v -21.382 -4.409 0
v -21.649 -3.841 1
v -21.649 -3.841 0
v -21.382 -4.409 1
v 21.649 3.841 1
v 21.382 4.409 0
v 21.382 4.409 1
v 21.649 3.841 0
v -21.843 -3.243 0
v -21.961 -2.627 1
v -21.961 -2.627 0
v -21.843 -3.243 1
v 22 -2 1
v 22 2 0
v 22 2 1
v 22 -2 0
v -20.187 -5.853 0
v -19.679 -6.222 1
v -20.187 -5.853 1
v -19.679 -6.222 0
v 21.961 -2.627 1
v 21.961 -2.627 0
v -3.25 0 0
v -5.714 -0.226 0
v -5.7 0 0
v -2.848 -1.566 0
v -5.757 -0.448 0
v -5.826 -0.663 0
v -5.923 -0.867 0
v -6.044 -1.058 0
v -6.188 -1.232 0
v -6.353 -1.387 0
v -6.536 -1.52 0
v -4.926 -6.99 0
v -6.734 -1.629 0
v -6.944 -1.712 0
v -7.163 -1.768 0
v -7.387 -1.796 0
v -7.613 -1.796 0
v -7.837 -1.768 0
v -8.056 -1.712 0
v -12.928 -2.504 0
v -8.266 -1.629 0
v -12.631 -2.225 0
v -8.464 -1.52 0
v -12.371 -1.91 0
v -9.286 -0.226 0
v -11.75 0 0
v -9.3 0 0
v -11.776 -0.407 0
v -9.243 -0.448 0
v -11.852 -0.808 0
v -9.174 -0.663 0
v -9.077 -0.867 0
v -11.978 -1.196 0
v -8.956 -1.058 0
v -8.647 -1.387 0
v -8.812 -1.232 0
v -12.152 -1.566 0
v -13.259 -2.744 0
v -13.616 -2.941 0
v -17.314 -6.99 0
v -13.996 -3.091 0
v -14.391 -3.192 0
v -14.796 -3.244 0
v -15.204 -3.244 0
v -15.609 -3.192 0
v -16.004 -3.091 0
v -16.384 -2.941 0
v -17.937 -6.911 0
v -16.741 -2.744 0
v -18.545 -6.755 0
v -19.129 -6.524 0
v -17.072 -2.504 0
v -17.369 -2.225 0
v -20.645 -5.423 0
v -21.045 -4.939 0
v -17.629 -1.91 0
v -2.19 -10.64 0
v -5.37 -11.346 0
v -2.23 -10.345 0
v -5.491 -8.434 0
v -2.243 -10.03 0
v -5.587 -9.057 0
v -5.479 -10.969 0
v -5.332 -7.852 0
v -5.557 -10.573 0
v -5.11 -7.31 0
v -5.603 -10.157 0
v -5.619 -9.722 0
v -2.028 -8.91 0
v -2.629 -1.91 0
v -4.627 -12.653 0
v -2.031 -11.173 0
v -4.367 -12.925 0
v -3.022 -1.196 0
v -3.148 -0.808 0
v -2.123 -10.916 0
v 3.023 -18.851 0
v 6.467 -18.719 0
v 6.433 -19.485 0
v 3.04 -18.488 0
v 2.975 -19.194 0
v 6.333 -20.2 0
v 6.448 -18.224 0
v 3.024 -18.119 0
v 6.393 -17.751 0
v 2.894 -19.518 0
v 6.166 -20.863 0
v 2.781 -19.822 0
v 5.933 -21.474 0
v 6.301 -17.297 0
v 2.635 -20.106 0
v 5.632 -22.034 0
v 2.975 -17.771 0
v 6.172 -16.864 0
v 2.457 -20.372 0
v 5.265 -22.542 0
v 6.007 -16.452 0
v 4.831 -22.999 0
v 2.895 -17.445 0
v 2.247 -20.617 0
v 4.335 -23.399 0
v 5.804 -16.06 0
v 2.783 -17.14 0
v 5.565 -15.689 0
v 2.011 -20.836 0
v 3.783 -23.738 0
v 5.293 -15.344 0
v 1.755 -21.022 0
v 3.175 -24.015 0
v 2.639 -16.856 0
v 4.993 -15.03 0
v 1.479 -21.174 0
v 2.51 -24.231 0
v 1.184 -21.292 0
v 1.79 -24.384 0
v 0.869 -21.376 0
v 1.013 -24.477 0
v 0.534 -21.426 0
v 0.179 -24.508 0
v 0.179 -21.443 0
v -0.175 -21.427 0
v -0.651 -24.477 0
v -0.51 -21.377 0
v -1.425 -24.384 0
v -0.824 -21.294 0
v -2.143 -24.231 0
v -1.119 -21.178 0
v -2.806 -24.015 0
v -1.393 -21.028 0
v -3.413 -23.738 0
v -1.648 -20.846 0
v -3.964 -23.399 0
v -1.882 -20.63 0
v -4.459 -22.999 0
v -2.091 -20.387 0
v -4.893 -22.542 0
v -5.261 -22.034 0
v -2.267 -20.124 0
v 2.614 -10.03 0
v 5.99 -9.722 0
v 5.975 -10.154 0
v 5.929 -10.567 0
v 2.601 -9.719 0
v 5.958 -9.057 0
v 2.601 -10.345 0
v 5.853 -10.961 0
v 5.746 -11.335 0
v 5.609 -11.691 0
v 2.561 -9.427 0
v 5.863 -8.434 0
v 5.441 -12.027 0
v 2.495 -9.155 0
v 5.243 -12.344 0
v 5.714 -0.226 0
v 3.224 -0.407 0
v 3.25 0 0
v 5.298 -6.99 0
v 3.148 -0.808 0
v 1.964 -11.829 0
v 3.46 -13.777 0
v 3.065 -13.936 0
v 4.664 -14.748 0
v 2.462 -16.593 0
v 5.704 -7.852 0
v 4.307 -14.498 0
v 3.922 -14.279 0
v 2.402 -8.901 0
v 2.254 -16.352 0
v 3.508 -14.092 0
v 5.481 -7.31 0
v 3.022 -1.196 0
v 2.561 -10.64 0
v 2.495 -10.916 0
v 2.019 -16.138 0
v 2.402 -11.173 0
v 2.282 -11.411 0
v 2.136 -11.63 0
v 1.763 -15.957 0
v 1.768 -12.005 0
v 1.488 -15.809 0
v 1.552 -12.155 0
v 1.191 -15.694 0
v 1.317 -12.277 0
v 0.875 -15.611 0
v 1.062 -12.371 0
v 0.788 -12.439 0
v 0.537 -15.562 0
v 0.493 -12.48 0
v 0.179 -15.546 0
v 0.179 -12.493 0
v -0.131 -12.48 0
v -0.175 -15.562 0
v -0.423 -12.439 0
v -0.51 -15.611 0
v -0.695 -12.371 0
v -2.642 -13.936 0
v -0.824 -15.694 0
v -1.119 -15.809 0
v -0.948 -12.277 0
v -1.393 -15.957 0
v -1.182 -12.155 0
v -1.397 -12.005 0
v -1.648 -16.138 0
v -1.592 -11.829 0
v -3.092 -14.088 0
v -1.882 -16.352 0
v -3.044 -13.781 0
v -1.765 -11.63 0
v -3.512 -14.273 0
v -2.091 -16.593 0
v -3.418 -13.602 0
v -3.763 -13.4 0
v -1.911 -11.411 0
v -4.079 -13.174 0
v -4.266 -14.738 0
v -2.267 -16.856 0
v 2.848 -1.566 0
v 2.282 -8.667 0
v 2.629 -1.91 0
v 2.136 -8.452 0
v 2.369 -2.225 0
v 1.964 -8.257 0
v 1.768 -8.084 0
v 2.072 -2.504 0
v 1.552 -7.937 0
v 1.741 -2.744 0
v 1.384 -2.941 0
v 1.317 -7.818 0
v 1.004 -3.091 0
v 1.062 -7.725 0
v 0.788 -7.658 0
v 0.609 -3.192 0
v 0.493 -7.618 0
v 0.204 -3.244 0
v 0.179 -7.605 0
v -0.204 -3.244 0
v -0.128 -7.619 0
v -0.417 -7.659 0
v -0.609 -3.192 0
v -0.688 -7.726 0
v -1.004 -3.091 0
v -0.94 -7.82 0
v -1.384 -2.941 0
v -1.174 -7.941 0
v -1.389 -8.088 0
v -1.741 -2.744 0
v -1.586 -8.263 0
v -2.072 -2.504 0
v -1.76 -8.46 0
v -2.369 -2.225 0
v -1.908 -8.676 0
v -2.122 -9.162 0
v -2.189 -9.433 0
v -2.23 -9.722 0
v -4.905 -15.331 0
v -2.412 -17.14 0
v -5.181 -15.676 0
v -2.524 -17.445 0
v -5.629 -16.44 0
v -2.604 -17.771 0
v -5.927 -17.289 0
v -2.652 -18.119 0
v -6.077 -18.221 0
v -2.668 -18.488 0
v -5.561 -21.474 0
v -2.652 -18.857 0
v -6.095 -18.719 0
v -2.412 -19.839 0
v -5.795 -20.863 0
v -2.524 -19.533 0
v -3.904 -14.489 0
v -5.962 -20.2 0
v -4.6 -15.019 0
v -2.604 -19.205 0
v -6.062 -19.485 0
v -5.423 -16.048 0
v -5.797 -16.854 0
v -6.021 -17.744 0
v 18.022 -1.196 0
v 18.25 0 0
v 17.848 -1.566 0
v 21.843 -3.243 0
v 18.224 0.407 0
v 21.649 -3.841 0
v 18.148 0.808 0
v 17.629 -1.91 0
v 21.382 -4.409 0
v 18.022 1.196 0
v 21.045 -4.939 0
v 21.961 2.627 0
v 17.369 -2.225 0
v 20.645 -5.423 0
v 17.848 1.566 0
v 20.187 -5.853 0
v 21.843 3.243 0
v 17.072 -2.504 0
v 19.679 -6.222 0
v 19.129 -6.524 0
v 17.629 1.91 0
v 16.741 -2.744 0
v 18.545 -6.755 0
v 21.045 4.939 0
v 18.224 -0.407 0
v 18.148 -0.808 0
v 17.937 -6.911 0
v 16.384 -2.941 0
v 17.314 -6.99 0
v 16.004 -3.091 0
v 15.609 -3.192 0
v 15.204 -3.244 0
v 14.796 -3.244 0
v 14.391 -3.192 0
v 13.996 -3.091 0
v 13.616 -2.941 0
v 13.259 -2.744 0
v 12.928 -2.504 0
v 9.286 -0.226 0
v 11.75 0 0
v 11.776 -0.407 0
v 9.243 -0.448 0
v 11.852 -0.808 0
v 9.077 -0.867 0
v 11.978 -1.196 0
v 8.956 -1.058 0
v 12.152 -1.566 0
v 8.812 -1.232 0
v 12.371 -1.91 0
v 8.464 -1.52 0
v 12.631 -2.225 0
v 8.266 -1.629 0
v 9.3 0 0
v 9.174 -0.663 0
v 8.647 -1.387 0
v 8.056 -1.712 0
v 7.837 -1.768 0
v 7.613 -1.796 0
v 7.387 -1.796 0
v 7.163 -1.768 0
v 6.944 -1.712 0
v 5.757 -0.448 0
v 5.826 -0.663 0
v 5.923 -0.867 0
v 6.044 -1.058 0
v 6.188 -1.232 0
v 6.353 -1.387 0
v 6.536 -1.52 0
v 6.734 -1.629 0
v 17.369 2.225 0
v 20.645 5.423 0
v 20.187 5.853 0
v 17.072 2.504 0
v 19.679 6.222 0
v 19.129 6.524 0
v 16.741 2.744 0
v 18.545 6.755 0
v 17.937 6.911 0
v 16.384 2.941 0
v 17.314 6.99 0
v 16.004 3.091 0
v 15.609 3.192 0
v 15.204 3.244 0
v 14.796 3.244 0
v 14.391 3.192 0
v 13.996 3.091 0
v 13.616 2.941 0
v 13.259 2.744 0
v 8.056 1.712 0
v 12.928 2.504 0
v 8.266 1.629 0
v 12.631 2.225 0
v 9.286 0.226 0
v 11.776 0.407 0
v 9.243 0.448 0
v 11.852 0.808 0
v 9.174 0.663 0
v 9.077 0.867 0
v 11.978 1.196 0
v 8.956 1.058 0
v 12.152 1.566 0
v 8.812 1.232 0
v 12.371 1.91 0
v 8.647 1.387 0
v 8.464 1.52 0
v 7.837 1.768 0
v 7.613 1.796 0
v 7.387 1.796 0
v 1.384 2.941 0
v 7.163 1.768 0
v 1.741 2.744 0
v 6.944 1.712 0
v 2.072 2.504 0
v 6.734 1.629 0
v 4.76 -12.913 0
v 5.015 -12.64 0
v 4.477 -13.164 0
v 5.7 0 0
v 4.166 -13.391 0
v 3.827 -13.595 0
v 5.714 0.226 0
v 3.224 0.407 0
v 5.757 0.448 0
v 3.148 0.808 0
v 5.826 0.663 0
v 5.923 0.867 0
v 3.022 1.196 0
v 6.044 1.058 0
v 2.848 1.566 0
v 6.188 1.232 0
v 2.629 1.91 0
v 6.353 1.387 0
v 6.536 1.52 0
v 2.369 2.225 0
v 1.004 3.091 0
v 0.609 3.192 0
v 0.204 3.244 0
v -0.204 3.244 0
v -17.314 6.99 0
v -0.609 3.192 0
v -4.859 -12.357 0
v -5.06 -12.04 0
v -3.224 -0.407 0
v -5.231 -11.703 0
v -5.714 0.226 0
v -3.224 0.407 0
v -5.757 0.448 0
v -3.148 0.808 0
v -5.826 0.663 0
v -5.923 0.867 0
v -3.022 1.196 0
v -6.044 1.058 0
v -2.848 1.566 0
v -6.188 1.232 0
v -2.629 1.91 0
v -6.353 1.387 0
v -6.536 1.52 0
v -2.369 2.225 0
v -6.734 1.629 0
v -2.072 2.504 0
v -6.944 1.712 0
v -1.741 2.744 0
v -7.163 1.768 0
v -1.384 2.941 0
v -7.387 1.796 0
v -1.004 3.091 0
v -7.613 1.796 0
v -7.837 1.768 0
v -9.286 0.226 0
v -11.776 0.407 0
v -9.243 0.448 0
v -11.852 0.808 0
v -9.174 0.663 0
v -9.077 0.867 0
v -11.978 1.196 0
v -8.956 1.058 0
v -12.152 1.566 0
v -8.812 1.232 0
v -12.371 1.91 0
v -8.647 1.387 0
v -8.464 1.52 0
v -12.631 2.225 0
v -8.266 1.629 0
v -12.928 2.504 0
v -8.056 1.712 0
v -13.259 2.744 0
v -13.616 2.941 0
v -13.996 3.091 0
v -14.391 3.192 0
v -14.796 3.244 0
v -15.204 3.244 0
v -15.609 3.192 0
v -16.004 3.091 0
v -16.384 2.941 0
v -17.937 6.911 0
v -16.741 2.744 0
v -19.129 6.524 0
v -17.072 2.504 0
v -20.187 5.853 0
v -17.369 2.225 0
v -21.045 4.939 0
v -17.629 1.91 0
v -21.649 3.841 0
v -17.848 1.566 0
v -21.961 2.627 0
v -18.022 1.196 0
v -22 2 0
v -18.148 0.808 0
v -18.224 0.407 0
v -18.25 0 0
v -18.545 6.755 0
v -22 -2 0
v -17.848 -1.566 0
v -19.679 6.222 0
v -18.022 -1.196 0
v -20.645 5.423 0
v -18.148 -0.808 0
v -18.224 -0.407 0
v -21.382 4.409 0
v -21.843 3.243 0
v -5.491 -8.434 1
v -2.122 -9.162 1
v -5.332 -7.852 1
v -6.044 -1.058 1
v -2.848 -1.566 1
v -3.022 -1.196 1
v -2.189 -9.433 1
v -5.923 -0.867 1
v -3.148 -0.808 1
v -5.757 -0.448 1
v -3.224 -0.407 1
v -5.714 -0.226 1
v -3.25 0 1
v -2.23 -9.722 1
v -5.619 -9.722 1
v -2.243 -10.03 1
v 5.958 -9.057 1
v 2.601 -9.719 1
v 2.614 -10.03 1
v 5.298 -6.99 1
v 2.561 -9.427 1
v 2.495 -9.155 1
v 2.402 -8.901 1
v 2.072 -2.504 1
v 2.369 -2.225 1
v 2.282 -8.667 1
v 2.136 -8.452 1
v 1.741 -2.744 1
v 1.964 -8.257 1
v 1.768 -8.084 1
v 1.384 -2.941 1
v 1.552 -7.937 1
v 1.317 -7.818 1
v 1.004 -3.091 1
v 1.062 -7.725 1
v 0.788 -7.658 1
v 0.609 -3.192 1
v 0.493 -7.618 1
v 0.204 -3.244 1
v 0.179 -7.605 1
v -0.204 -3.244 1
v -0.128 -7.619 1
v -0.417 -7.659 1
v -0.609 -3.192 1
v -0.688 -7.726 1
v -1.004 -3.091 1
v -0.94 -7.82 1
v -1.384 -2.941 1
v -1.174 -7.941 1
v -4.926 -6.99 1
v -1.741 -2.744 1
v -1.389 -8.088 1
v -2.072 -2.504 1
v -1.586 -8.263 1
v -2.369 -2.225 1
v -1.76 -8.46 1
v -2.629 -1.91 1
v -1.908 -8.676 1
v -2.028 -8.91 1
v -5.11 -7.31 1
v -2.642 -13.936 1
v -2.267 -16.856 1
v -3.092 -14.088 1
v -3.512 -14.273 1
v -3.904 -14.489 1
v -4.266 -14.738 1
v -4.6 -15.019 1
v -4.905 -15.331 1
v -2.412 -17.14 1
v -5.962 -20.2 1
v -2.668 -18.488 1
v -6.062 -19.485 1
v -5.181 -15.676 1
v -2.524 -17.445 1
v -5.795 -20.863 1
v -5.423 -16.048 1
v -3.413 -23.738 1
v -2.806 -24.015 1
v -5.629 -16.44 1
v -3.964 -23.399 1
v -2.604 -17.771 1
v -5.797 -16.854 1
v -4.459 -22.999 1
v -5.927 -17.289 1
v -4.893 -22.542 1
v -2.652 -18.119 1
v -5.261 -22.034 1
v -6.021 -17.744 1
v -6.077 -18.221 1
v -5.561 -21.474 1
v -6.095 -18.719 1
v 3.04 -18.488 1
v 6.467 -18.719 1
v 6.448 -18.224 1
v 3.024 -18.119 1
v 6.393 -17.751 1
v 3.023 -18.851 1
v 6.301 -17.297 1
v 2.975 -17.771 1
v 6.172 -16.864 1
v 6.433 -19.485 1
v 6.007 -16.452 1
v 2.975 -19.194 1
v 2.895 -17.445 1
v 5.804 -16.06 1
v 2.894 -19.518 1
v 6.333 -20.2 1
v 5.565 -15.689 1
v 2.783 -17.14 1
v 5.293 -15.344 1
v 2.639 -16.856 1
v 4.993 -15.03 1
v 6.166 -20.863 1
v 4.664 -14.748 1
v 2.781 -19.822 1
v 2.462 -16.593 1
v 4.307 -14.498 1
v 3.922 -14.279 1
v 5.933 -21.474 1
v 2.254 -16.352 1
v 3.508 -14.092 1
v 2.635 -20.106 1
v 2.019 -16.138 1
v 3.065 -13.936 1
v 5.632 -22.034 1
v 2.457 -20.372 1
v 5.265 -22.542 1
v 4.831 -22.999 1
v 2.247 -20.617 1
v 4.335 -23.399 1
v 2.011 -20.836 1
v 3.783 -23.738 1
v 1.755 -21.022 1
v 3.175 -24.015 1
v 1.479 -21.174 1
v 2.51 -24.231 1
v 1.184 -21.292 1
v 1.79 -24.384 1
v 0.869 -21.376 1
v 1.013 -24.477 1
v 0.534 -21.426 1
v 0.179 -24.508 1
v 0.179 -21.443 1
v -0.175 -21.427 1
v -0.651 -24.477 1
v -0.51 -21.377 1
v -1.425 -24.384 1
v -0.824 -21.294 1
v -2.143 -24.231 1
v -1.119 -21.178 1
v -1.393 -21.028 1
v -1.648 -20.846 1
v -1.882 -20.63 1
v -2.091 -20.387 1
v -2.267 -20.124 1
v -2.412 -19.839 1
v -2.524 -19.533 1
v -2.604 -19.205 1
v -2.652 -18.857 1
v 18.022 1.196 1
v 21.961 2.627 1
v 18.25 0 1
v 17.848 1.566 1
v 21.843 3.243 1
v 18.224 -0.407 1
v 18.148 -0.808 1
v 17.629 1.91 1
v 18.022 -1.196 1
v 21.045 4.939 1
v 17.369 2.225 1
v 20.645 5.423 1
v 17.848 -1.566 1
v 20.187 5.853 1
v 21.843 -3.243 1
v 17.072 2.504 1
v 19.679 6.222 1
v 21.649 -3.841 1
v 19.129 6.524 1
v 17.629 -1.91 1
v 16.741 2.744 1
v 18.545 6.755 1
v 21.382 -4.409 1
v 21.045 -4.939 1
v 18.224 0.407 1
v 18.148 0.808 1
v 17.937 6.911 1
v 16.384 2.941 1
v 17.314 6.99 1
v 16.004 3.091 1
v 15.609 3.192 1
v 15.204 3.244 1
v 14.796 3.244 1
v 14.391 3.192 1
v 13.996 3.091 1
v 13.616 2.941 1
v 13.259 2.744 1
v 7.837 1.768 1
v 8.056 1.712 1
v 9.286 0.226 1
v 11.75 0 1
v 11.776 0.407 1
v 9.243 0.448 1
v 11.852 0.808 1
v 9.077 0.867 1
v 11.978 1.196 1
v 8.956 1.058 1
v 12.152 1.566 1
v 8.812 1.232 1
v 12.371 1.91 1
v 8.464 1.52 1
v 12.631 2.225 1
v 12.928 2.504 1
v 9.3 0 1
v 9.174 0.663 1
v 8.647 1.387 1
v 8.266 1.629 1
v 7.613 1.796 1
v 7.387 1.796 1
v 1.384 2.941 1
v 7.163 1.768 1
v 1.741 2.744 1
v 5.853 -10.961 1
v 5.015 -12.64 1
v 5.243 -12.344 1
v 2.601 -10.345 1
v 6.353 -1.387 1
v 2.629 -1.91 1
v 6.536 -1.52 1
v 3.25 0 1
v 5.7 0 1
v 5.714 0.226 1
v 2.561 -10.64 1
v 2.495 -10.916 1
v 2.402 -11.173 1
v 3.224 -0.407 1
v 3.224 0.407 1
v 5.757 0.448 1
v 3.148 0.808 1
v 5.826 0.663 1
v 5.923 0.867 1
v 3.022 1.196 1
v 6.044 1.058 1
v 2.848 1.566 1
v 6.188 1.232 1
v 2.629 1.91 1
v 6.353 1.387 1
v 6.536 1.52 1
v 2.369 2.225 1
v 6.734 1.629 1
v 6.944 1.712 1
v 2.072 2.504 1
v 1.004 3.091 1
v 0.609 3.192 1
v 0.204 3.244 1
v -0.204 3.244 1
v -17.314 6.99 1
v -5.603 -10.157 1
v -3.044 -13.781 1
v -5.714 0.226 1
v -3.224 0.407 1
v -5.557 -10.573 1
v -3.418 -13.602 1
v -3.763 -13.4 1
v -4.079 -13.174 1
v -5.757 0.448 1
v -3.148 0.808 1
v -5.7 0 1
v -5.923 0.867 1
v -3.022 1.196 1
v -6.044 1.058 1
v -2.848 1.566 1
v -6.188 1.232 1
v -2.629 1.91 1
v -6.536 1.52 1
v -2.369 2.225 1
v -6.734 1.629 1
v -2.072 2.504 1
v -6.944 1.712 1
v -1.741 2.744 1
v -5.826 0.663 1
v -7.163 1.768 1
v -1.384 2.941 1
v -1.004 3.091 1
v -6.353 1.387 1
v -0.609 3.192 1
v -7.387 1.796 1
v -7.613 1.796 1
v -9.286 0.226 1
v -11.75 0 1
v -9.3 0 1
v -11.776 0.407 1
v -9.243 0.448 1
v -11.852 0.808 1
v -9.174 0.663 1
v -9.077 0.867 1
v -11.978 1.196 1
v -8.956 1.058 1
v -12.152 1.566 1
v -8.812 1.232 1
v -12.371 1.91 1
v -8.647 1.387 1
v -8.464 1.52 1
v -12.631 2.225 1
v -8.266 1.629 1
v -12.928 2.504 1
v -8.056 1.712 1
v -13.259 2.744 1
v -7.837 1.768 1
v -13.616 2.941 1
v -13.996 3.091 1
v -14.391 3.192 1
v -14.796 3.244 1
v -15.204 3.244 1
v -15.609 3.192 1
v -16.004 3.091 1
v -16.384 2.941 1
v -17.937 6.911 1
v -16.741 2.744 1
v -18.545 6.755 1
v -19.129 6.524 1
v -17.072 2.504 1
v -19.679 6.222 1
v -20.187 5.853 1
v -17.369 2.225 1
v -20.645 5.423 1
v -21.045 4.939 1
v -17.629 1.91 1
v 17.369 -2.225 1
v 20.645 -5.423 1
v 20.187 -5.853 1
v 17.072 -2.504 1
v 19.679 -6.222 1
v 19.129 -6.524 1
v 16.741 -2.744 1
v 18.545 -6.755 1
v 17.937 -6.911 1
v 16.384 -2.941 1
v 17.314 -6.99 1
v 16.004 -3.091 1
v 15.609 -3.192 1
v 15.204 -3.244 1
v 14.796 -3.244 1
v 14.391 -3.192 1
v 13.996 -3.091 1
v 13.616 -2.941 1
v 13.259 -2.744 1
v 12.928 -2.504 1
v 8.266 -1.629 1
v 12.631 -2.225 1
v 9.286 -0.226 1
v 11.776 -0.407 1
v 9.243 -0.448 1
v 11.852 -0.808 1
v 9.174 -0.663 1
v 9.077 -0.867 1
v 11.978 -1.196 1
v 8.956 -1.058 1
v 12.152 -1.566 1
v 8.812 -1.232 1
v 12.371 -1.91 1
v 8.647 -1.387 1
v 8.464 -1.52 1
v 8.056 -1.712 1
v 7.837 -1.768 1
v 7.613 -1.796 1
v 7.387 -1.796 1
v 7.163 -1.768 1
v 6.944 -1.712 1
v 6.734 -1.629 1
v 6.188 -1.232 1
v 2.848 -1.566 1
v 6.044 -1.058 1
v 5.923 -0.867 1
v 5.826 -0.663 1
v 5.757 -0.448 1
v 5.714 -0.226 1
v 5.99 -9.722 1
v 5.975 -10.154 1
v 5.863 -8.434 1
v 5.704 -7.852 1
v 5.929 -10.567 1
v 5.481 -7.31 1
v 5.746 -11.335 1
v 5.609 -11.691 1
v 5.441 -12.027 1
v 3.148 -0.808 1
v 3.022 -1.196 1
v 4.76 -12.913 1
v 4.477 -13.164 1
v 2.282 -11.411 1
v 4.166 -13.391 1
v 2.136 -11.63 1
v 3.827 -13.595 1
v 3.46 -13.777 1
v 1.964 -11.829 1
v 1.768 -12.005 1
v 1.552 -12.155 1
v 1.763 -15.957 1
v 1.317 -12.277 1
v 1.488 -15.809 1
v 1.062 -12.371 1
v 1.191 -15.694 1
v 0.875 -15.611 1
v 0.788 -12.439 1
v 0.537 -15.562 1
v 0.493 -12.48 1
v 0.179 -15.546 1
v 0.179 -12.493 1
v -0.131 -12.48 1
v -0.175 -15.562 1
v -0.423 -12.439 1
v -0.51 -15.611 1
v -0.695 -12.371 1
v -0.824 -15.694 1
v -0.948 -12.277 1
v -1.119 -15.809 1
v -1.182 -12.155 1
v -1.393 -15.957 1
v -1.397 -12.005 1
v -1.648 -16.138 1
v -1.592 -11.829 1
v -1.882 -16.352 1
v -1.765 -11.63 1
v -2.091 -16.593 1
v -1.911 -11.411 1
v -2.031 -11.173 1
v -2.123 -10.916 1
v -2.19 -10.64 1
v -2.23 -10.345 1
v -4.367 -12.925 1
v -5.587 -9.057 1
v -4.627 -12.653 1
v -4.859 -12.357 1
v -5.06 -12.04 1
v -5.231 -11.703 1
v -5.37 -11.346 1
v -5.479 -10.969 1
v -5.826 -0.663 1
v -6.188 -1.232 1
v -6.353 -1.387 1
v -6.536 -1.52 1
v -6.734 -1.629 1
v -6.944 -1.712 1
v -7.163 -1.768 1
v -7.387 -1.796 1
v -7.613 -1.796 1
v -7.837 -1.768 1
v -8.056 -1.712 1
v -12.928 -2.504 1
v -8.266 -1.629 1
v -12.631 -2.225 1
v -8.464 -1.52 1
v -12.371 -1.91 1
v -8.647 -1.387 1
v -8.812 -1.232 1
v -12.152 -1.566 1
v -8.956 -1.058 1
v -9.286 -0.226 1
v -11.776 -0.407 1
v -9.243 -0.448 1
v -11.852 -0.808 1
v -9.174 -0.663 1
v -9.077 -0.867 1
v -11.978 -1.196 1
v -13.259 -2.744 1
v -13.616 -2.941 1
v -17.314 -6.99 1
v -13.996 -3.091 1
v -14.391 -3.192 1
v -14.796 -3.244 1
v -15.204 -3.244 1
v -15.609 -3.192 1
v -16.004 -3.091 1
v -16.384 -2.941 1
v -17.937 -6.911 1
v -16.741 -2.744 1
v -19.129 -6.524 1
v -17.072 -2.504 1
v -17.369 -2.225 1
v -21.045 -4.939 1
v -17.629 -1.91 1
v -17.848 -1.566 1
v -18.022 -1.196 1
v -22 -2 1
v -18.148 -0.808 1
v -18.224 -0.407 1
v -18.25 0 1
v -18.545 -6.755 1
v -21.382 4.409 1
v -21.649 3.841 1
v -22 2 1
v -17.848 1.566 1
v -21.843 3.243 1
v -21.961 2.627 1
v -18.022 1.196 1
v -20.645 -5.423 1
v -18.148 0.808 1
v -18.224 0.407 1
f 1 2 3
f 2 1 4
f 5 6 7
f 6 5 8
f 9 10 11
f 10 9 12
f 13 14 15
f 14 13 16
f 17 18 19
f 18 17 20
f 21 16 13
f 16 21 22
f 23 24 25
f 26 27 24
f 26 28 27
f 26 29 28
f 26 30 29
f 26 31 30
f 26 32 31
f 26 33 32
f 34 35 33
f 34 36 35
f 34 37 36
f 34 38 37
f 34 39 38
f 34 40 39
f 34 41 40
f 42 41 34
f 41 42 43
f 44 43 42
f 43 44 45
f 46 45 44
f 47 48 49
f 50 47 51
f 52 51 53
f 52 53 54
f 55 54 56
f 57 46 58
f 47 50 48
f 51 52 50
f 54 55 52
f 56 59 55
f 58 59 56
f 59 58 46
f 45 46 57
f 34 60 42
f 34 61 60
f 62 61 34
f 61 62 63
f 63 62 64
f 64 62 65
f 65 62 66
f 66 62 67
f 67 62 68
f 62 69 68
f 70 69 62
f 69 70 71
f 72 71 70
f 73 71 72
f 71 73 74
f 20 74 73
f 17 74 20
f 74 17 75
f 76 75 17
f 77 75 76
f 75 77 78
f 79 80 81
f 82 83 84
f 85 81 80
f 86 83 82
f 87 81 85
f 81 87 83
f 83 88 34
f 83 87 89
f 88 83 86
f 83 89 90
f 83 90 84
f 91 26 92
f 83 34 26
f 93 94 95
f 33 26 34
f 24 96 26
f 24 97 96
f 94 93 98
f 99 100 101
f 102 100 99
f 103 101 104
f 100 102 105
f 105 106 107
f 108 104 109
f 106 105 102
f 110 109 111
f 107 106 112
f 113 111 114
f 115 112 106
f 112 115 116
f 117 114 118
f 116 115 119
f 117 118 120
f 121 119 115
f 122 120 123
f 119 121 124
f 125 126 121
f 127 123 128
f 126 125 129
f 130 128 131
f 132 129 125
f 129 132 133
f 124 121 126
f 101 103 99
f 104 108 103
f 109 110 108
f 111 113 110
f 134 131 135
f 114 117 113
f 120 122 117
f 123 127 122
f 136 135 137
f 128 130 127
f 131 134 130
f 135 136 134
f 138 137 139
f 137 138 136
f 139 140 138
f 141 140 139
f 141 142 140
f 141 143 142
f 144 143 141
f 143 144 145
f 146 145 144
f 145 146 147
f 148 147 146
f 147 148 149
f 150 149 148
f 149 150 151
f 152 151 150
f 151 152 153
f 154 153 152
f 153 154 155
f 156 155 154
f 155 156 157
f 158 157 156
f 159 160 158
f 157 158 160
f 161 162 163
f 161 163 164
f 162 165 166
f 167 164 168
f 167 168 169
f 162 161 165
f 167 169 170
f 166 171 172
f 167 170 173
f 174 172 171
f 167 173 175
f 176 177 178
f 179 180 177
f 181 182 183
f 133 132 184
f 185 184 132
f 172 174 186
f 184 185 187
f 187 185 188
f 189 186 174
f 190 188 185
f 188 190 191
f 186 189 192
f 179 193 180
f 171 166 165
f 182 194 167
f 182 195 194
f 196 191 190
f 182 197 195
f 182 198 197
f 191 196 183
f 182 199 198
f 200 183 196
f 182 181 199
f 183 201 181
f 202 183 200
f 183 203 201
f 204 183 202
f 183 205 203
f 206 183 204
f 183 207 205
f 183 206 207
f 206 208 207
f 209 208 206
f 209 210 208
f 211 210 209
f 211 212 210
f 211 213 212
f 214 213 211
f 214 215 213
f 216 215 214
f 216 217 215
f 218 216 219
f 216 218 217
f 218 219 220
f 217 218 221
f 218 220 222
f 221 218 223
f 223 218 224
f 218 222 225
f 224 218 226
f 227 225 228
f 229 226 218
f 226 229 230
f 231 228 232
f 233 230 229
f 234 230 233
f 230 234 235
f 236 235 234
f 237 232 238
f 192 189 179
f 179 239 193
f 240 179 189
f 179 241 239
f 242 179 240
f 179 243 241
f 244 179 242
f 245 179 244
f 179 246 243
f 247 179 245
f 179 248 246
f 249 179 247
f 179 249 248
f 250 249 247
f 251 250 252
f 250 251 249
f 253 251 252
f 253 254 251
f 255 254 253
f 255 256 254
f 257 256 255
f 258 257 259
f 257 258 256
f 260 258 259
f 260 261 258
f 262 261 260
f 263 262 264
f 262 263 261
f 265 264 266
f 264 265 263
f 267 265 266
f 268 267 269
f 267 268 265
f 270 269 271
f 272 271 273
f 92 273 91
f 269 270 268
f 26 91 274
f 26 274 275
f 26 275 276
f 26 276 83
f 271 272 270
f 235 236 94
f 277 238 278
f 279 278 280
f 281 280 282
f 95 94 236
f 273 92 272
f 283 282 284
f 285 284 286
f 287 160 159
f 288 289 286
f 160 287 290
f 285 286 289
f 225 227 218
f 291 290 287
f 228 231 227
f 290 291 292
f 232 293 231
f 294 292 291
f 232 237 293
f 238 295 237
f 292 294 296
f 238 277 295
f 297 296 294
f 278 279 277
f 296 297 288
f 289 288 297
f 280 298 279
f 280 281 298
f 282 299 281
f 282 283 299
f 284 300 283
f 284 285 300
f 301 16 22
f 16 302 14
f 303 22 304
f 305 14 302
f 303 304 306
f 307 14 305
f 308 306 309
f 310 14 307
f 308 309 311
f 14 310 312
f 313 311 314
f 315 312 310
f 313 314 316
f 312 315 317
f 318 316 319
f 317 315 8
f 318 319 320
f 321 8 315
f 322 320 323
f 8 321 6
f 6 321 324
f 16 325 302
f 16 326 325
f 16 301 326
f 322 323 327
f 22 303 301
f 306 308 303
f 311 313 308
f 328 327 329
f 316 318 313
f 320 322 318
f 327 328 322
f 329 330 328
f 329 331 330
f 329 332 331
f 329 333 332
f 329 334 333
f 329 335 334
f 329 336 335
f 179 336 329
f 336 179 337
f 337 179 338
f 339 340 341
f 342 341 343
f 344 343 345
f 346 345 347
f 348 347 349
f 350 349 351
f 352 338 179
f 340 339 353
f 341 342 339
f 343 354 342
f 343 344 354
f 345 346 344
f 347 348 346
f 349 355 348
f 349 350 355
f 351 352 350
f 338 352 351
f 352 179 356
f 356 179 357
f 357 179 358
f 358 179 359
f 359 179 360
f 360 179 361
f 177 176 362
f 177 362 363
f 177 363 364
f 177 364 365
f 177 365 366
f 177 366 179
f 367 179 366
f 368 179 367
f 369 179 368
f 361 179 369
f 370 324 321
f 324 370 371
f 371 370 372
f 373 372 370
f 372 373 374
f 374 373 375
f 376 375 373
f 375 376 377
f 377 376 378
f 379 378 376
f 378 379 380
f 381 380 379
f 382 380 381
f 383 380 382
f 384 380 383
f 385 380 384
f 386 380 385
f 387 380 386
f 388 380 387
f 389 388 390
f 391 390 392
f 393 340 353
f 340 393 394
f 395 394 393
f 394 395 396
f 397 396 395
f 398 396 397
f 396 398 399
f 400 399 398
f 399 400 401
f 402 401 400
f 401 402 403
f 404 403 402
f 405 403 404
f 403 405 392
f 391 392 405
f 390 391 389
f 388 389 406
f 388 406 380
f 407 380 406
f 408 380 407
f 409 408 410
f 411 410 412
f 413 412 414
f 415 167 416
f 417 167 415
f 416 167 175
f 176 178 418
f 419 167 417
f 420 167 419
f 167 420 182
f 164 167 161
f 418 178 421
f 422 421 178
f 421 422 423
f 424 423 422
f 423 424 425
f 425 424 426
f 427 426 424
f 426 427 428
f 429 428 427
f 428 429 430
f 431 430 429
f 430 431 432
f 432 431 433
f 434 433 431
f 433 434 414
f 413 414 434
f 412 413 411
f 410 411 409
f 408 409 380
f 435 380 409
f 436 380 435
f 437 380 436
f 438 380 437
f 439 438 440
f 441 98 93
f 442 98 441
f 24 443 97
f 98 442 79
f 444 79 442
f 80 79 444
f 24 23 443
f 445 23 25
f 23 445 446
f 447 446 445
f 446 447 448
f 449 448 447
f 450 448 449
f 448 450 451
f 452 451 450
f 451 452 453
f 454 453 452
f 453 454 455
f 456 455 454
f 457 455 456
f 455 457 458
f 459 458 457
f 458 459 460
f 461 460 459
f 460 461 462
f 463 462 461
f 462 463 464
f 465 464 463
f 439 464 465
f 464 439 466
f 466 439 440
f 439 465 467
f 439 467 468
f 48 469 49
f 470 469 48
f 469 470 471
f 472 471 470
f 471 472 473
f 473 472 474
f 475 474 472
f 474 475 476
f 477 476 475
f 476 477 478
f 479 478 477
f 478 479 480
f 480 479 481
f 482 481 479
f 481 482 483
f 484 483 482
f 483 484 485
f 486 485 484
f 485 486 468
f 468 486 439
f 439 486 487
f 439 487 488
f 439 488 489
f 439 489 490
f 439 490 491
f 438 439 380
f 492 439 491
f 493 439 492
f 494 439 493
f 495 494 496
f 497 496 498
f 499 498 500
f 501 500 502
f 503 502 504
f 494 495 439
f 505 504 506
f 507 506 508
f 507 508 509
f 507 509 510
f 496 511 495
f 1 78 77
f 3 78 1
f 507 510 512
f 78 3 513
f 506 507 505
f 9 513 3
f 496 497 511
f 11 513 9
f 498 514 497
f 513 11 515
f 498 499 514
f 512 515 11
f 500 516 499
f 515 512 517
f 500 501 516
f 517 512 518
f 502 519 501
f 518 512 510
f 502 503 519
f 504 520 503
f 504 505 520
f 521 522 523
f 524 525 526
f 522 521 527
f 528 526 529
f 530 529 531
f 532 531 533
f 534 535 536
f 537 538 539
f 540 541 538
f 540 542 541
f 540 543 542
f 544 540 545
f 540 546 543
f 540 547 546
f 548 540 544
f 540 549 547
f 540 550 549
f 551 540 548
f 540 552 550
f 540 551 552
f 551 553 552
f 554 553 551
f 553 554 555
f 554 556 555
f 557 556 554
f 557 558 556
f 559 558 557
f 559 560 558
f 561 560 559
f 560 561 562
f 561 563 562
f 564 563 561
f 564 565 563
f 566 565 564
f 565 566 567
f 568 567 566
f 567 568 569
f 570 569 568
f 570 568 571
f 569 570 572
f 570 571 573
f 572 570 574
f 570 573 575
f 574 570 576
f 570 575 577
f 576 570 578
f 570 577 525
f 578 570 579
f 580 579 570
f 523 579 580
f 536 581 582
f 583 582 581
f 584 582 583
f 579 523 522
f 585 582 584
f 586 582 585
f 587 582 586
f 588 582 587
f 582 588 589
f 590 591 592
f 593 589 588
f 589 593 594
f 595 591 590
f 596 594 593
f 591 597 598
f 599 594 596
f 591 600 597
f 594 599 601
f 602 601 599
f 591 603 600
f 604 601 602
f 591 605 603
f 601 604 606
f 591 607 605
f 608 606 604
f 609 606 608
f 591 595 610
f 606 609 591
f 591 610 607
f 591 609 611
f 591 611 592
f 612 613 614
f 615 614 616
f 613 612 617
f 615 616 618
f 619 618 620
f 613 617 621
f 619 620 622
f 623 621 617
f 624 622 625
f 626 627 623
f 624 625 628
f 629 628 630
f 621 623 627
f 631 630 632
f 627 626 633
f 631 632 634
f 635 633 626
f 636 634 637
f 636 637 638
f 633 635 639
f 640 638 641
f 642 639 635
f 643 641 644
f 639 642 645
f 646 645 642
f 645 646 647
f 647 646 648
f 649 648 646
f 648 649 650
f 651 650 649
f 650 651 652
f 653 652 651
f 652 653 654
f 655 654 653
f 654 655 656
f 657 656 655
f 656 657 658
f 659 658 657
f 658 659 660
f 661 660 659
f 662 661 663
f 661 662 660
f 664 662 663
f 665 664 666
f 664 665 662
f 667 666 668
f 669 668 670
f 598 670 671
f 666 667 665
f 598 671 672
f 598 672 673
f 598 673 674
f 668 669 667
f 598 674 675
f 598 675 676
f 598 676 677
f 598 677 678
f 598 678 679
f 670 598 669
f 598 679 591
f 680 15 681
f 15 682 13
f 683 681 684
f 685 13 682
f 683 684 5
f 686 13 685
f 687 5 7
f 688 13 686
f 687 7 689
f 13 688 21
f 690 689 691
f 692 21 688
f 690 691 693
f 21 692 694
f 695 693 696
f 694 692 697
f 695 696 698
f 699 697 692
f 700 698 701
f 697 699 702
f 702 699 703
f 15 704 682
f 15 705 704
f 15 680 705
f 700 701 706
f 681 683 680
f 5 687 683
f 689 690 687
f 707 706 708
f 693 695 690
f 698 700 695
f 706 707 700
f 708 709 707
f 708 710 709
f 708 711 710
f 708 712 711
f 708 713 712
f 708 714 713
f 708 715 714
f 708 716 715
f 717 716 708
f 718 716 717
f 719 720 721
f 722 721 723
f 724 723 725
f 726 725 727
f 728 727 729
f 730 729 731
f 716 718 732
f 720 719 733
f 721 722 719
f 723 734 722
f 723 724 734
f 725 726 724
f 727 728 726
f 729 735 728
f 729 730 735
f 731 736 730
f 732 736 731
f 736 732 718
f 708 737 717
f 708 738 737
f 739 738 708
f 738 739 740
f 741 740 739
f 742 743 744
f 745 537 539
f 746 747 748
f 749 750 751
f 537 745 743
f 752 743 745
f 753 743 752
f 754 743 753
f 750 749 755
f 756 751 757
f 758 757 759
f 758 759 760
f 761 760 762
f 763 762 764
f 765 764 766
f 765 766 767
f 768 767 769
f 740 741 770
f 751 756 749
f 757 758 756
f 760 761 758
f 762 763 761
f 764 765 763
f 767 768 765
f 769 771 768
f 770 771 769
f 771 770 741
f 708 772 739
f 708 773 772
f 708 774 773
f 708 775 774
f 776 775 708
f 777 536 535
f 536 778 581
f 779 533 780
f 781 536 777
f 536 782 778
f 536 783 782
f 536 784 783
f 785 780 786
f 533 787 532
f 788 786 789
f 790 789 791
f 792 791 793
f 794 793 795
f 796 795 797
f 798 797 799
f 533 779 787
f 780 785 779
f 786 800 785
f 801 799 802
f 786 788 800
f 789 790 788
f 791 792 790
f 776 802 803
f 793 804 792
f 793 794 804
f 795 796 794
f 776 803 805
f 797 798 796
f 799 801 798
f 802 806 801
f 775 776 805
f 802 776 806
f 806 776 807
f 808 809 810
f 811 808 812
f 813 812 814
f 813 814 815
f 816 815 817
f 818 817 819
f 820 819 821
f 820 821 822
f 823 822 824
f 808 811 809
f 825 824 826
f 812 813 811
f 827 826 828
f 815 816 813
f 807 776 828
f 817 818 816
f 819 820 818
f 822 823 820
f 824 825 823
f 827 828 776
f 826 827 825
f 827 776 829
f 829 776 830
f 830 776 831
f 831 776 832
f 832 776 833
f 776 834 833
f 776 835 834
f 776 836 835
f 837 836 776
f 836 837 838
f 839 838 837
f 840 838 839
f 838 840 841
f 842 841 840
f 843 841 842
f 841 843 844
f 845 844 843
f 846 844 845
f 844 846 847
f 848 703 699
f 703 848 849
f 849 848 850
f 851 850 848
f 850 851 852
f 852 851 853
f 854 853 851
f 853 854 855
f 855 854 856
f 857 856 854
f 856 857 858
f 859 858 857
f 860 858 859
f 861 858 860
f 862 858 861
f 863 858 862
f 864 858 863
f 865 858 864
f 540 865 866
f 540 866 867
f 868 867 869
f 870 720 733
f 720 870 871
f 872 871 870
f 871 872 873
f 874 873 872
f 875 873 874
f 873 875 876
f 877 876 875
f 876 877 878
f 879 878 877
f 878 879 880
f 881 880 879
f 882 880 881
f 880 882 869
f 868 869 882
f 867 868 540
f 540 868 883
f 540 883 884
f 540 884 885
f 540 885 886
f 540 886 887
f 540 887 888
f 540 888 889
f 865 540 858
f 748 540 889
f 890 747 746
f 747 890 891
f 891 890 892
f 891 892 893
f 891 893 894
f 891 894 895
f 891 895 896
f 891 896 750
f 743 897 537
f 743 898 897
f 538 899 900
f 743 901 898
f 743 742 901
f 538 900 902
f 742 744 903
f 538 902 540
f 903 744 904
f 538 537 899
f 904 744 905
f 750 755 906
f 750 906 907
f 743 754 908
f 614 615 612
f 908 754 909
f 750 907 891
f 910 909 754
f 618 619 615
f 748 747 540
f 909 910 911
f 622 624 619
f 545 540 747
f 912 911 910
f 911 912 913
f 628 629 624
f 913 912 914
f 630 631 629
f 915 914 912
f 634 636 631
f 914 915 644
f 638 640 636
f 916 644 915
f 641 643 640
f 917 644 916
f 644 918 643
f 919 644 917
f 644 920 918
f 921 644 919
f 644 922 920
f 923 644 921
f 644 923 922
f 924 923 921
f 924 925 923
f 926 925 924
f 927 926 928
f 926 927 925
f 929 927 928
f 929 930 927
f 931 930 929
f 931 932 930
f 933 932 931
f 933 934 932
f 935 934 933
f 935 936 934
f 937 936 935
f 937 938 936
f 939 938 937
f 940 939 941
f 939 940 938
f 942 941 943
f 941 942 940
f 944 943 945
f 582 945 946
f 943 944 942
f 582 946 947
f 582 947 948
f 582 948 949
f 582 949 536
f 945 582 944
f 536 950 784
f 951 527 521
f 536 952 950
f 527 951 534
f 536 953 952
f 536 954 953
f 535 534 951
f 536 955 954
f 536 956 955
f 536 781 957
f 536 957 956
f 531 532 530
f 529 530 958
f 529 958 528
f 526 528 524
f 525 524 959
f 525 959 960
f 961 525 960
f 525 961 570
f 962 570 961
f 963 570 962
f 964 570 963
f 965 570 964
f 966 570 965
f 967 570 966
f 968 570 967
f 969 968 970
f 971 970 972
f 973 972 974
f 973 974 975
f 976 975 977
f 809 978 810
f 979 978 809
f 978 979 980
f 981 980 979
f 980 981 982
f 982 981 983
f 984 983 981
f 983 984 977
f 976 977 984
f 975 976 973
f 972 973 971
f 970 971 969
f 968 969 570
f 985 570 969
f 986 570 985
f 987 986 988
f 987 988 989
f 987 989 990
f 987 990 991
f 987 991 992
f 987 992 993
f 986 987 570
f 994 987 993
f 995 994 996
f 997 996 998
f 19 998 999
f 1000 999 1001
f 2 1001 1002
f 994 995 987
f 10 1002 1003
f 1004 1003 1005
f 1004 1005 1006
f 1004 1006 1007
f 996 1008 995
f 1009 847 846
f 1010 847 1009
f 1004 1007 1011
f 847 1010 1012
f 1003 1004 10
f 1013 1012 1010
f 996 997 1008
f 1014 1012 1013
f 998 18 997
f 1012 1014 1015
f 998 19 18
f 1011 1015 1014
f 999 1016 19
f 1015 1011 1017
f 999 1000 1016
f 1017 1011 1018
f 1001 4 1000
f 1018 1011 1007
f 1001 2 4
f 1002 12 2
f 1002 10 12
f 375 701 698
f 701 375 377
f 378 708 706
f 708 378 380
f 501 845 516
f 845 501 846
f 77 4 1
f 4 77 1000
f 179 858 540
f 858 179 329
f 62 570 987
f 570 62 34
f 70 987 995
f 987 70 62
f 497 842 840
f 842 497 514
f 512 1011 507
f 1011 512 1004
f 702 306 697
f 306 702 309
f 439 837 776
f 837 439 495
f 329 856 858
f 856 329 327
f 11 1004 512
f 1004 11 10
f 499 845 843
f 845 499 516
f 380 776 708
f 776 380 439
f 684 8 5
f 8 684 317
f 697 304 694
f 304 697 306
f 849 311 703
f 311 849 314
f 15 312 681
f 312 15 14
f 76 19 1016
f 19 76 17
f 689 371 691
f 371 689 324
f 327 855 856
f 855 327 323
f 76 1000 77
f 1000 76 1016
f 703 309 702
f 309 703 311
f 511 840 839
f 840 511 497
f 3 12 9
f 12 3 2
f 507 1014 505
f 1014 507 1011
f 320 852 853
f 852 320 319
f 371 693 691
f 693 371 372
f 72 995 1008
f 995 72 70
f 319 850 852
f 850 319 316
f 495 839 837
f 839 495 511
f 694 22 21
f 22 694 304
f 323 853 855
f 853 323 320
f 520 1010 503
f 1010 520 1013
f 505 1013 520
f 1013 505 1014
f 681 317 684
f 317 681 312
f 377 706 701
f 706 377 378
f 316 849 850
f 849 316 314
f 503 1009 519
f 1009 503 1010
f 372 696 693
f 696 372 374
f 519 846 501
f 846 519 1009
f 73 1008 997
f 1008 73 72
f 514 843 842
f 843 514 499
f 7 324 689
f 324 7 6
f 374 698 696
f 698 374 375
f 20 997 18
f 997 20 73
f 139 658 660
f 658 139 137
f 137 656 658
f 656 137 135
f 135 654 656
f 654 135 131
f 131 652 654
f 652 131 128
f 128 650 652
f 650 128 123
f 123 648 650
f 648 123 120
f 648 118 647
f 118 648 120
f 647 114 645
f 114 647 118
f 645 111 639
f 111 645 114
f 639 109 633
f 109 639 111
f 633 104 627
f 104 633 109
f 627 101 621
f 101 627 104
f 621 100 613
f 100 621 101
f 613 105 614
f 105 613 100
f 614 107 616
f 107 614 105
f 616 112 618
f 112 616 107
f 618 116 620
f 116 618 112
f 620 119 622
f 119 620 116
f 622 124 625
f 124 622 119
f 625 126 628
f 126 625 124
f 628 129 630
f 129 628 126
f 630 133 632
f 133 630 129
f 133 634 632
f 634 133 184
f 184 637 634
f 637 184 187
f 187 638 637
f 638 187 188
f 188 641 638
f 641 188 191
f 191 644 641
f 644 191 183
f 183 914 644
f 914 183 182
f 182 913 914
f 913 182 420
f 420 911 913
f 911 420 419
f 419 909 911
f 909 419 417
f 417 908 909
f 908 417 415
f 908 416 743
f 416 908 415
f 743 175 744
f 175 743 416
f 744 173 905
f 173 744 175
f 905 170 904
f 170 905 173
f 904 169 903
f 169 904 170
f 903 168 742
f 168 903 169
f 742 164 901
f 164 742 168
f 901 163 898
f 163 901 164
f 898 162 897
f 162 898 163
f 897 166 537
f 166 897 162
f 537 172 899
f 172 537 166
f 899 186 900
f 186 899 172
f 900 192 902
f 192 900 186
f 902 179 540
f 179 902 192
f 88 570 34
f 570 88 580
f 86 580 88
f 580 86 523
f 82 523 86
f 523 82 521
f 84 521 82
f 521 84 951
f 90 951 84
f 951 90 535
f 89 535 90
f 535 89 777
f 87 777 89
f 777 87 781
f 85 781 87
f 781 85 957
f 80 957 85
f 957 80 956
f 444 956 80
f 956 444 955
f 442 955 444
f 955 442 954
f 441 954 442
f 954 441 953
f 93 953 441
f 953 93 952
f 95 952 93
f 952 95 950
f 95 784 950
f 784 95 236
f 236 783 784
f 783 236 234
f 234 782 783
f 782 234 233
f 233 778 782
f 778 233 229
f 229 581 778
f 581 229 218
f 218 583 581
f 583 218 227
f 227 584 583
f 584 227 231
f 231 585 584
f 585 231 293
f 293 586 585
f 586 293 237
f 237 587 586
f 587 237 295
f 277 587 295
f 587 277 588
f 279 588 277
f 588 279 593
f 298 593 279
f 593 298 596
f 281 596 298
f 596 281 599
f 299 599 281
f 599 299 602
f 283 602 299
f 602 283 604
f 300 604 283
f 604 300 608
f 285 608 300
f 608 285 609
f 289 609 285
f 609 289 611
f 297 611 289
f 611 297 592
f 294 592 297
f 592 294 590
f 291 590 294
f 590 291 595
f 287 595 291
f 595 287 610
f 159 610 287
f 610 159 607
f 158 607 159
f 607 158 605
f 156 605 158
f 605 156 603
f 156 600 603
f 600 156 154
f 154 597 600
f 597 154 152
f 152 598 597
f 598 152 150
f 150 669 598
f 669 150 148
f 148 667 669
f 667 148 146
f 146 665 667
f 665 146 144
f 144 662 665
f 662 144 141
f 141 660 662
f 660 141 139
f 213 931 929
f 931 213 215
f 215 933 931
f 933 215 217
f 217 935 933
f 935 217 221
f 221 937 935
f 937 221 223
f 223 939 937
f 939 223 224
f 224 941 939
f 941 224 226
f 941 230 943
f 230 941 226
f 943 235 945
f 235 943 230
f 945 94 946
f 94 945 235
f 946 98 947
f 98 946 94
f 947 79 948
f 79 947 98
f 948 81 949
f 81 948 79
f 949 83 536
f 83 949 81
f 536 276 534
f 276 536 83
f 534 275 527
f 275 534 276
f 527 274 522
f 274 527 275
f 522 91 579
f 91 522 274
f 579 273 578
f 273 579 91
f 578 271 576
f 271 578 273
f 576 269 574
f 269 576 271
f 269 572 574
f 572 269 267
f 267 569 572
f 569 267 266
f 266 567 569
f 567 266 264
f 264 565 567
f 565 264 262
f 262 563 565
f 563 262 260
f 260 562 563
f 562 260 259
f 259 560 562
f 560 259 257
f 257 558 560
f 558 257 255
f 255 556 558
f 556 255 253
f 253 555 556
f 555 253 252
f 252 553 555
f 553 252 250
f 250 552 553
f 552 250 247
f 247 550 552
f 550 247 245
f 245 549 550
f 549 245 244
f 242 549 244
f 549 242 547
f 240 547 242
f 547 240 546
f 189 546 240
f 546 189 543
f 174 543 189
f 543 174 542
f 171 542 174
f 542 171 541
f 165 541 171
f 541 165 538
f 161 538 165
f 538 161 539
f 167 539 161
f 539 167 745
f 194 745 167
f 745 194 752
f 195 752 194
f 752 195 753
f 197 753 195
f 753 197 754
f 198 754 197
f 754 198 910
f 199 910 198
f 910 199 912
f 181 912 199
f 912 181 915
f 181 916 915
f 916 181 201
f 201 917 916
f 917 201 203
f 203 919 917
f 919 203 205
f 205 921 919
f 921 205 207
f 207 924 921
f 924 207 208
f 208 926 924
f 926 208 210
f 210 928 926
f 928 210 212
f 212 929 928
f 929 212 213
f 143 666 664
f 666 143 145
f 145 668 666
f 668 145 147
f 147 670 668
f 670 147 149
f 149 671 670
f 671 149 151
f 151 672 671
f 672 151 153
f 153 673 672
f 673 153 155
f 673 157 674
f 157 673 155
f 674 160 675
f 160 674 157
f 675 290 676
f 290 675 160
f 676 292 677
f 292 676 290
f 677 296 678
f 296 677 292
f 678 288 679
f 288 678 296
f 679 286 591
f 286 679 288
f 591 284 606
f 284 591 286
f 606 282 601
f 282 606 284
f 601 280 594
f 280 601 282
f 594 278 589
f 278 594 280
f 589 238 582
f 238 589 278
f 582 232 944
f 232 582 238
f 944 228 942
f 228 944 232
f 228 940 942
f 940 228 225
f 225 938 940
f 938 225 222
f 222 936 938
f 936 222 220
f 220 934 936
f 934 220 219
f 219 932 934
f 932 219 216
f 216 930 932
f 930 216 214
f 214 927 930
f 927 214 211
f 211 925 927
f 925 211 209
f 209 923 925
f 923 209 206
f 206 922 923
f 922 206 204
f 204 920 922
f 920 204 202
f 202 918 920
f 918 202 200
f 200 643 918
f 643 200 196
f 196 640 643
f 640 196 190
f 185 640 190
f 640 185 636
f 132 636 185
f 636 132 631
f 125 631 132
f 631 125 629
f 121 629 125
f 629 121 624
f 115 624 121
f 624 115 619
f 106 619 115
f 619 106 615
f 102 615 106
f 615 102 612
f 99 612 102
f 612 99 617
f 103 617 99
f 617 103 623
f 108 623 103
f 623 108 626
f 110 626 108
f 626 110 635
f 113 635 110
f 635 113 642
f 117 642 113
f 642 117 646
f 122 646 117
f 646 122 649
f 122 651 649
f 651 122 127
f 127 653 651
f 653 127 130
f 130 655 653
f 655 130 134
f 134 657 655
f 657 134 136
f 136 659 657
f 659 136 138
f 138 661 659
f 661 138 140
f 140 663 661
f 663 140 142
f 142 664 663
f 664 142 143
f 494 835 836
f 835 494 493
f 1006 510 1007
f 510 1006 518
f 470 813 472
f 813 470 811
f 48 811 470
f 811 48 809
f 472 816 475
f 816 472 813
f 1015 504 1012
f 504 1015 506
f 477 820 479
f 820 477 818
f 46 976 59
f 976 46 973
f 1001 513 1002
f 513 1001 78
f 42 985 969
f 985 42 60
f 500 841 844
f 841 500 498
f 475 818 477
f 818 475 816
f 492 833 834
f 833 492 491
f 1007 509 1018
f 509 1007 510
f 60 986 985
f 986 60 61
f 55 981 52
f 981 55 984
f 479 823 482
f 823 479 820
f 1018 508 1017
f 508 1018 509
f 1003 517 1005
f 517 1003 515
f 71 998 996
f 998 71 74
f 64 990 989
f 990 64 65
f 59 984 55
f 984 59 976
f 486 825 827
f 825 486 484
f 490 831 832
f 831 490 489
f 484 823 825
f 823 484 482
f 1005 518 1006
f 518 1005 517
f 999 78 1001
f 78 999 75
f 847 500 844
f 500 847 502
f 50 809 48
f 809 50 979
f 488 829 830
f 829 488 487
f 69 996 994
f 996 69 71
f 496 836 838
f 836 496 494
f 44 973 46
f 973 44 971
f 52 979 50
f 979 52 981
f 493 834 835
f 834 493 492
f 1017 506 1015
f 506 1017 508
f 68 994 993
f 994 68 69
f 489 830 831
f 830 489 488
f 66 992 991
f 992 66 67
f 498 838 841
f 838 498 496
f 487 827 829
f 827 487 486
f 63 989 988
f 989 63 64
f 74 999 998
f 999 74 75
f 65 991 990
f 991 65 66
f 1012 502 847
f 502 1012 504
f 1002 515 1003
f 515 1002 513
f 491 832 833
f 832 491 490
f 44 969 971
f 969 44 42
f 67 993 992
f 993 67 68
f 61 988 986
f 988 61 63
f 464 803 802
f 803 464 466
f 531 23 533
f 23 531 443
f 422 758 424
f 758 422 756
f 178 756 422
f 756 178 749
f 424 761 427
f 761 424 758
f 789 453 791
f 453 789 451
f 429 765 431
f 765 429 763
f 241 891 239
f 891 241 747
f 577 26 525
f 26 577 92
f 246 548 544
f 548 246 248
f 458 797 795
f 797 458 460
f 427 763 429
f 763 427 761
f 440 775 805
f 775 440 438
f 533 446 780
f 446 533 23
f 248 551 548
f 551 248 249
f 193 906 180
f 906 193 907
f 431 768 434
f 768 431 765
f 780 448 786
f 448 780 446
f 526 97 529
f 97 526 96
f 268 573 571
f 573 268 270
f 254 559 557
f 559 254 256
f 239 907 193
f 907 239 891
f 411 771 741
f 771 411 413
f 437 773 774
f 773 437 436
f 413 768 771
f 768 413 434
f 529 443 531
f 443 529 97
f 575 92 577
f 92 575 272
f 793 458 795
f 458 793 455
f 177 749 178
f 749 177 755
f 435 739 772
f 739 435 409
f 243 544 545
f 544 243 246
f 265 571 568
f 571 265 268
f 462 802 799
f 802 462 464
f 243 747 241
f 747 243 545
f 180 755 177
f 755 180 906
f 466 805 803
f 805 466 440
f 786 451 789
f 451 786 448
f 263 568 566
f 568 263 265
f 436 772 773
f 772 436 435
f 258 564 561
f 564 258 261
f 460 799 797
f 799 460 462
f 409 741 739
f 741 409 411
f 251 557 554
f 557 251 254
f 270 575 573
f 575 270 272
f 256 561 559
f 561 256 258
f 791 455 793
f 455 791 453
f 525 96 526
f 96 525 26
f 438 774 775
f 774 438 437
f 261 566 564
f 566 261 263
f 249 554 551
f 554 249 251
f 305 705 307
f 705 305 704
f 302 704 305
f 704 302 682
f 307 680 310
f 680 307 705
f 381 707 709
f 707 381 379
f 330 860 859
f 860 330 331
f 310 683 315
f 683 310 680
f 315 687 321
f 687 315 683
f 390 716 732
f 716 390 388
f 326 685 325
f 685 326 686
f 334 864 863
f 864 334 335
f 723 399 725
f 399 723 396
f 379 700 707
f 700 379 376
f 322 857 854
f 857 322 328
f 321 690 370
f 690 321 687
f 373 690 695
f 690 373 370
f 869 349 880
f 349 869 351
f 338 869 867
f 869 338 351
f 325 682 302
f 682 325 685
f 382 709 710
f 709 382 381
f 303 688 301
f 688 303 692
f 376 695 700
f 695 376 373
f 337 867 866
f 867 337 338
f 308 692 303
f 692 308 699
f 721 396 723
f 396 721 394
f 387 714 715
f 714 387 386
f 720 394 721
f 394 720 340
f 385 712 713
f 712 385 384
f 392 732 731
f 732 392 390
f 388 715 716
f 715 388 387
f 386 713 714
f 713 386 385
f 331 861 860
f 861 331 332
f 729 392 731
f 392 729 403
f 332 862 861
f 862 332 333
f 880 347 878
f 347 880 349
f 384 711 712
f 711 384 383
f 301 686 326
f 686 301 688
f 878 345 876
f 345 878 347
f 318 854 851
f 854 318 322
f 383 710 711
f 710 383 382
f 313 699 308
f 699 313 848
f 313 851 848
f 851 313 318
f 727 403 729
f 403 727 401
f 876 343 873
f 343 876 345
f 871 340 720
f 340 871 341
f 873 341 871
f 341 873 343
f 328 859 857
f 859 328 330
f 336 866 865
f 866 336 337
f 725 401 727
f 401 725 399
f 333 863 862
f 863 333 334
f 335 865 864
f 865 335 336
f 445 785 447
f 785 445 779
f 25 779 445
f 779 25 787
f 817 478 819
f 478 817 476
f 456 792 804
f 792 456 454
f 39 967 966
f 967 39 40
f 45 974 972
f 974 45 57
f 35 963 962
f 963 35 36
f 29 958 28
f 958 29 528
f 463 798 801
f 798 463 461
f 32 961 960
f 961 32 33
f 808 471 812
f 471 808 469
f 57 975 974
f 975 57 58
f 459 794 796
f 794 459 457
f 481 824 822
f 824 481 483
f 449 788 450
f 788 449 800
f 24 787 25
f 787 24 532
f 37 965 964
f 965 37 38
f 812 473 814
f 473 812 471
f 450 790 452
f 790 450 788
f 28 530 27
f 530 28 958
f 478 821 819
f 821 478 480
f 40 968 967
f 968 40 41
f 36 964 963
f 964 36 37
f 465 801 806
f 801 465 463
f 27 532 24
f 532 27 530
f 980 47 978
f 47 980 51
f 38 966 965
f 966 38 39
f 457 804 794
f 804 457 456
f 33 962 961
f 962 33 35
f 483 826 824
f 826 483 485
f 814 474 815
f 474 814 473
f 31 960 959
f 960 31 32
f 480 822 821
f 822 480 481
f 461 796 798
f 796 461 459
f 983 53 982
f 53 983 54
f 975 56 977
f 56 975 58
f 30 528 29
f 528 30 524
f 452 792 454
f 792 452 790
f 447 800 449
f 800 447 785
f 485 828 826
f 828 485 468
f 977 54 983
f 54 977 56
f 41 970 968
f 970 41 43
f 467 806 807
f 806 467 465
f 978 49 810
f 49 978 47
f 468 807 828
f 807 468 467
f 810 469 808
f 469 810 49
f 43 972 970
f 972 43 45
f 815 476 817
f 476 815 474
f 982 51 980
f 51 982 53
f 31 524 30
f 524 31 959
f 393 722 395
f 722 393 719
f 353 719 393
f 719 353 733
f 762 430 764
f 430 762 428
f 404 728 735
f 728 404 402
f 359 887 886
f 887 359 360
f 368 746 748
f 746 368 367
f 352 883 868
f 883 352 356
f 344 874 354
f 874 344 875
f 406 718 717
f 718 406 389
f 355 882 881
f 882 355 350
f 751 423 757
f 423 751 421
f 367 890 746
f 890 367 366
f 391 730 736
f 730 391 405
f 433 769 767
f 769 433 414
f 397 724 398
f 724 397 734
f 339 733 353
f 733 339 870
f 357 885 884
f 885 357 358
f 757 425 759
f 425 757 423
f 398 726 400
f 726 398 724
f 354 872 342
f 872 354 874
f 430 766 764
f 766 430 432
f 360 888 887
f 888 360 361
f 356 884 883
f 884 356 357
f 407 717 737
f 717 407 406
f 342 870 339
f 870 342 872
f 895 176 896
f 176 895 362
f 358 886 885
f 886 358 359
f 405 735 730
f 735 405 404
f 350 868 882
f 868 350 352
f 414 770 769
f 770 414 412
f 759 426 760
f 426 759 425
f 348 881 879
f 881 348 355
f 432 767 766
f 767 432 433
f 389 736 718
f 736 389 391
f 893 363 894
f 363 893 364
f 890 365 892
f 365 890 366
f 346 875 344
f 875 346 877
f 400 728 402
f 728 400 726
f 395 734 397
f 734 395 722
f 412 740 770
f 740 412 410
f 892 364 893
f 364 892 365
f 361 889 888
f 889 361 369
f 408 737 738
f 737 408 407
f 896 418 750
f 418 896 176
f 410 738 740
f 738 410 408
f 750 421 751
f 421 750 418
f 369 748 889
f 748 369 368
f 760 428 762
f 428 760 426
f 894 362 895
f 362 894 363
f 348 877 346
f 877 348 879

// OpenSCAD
$fn = 50;


difference() {
	union() {
		*color(alpha = 1.0000000000, c = "gray") {
			translate(v = [0, 14, 0]) {
				linear_extrude(height = 1) {
					text(font = "Arial:style=Bold", halign = "center", size = 4.5000000000, text = "COMMENT description oobb_plate_shape_p_type_1_depth_3_width_1_thickness_8_extra_oobb_size", valign = "center");
				}
			}
		}
		hull() {
			translate(v = [-17.0000000000, 2.0000000000, 0]) {
				cylinder(h = 1, r = 5);
			}
			translate(v = [17.0000000000, 2.0000000000, 0]) {
				cylinder(h = 1, r = 5);
			}
			translate(v = [-17.0000000000, -2.0000000000, 0]) {
				cylinder(h = 1, r = 5);
			}
			translate(v = [17.0000000000, -2.0000000000, 0]) {
				cylinder(h = 1, r = 5);
			}
		}
		translate(v = [0, -5, 0]) {
			linear_extrude(height = 1) {
				text(font = "DejaVu Sans Mono:style=Bold", halign = "center", size = 19.0000000000, text = "8", valign = "top");
			}
		}
	}
	union() {
		*color(alpha = 1.0000000000, c = "gray") {
			translate(v = [0, 14, 0]) {
				linear_extrude(height = 1) {
					text(font = "Arial:style=Bold", halign = "center", size = 4.5000000000, text = "COMMENT description oobb_holes_shape_n_type_3_width_1_thickness_8_extra_oobb_size_1_height_'all'_holes_true_both_holes", valign = "center");
				}
			}
		}
		translate(v = [-15.0000000000, 0.0000000000, 0]) {
			translate(v = [0, 0, -50]) {
				cylinder(h = 100, r = 3.2500000000);
			}
		}
		translate(v = [0, 0, -50]) {
			cylinder(h = 100, r = 3.2500000000);
		}
		translate(v = [15.0000000000, 0.0000000000, 0]) {
			translate(v = [0, 0, -50]) {
				cylinder(h = 100, r = 3.2500000000);
			}
		}
		translate(v = [-15.0000000000, 0.0000000000, 0]) {
			translate(v = [0, 0, -50]) {
				cylinder(h = 100, r = 1.8000000000);
			}
		}
		translate(v = [-7.5000000000, 0.0000000000, 0]) {
			translate(v = [0, 0, -50]) {
				cylinder(h = 100, r = 1.8000000000);
			}
		}
		translate(v = [0, 0, -50]) {
			cylinder(h = 100, r = 1.8000000000);
		}
		translate(v = [7.5000000000, 0.0000000000, 0]) {
			translate(v = [0, 0, -50]) {
				cylinder(h = 100, r = 1.8000000000);
			}
		}
		translate(v = [15.0000000000, 0.0000000000, 0]) {
			translate(v = [0, 0, -50]) {
				cylinder(h = 100, r = 1.8000000000);
			}
		}
	}
}
